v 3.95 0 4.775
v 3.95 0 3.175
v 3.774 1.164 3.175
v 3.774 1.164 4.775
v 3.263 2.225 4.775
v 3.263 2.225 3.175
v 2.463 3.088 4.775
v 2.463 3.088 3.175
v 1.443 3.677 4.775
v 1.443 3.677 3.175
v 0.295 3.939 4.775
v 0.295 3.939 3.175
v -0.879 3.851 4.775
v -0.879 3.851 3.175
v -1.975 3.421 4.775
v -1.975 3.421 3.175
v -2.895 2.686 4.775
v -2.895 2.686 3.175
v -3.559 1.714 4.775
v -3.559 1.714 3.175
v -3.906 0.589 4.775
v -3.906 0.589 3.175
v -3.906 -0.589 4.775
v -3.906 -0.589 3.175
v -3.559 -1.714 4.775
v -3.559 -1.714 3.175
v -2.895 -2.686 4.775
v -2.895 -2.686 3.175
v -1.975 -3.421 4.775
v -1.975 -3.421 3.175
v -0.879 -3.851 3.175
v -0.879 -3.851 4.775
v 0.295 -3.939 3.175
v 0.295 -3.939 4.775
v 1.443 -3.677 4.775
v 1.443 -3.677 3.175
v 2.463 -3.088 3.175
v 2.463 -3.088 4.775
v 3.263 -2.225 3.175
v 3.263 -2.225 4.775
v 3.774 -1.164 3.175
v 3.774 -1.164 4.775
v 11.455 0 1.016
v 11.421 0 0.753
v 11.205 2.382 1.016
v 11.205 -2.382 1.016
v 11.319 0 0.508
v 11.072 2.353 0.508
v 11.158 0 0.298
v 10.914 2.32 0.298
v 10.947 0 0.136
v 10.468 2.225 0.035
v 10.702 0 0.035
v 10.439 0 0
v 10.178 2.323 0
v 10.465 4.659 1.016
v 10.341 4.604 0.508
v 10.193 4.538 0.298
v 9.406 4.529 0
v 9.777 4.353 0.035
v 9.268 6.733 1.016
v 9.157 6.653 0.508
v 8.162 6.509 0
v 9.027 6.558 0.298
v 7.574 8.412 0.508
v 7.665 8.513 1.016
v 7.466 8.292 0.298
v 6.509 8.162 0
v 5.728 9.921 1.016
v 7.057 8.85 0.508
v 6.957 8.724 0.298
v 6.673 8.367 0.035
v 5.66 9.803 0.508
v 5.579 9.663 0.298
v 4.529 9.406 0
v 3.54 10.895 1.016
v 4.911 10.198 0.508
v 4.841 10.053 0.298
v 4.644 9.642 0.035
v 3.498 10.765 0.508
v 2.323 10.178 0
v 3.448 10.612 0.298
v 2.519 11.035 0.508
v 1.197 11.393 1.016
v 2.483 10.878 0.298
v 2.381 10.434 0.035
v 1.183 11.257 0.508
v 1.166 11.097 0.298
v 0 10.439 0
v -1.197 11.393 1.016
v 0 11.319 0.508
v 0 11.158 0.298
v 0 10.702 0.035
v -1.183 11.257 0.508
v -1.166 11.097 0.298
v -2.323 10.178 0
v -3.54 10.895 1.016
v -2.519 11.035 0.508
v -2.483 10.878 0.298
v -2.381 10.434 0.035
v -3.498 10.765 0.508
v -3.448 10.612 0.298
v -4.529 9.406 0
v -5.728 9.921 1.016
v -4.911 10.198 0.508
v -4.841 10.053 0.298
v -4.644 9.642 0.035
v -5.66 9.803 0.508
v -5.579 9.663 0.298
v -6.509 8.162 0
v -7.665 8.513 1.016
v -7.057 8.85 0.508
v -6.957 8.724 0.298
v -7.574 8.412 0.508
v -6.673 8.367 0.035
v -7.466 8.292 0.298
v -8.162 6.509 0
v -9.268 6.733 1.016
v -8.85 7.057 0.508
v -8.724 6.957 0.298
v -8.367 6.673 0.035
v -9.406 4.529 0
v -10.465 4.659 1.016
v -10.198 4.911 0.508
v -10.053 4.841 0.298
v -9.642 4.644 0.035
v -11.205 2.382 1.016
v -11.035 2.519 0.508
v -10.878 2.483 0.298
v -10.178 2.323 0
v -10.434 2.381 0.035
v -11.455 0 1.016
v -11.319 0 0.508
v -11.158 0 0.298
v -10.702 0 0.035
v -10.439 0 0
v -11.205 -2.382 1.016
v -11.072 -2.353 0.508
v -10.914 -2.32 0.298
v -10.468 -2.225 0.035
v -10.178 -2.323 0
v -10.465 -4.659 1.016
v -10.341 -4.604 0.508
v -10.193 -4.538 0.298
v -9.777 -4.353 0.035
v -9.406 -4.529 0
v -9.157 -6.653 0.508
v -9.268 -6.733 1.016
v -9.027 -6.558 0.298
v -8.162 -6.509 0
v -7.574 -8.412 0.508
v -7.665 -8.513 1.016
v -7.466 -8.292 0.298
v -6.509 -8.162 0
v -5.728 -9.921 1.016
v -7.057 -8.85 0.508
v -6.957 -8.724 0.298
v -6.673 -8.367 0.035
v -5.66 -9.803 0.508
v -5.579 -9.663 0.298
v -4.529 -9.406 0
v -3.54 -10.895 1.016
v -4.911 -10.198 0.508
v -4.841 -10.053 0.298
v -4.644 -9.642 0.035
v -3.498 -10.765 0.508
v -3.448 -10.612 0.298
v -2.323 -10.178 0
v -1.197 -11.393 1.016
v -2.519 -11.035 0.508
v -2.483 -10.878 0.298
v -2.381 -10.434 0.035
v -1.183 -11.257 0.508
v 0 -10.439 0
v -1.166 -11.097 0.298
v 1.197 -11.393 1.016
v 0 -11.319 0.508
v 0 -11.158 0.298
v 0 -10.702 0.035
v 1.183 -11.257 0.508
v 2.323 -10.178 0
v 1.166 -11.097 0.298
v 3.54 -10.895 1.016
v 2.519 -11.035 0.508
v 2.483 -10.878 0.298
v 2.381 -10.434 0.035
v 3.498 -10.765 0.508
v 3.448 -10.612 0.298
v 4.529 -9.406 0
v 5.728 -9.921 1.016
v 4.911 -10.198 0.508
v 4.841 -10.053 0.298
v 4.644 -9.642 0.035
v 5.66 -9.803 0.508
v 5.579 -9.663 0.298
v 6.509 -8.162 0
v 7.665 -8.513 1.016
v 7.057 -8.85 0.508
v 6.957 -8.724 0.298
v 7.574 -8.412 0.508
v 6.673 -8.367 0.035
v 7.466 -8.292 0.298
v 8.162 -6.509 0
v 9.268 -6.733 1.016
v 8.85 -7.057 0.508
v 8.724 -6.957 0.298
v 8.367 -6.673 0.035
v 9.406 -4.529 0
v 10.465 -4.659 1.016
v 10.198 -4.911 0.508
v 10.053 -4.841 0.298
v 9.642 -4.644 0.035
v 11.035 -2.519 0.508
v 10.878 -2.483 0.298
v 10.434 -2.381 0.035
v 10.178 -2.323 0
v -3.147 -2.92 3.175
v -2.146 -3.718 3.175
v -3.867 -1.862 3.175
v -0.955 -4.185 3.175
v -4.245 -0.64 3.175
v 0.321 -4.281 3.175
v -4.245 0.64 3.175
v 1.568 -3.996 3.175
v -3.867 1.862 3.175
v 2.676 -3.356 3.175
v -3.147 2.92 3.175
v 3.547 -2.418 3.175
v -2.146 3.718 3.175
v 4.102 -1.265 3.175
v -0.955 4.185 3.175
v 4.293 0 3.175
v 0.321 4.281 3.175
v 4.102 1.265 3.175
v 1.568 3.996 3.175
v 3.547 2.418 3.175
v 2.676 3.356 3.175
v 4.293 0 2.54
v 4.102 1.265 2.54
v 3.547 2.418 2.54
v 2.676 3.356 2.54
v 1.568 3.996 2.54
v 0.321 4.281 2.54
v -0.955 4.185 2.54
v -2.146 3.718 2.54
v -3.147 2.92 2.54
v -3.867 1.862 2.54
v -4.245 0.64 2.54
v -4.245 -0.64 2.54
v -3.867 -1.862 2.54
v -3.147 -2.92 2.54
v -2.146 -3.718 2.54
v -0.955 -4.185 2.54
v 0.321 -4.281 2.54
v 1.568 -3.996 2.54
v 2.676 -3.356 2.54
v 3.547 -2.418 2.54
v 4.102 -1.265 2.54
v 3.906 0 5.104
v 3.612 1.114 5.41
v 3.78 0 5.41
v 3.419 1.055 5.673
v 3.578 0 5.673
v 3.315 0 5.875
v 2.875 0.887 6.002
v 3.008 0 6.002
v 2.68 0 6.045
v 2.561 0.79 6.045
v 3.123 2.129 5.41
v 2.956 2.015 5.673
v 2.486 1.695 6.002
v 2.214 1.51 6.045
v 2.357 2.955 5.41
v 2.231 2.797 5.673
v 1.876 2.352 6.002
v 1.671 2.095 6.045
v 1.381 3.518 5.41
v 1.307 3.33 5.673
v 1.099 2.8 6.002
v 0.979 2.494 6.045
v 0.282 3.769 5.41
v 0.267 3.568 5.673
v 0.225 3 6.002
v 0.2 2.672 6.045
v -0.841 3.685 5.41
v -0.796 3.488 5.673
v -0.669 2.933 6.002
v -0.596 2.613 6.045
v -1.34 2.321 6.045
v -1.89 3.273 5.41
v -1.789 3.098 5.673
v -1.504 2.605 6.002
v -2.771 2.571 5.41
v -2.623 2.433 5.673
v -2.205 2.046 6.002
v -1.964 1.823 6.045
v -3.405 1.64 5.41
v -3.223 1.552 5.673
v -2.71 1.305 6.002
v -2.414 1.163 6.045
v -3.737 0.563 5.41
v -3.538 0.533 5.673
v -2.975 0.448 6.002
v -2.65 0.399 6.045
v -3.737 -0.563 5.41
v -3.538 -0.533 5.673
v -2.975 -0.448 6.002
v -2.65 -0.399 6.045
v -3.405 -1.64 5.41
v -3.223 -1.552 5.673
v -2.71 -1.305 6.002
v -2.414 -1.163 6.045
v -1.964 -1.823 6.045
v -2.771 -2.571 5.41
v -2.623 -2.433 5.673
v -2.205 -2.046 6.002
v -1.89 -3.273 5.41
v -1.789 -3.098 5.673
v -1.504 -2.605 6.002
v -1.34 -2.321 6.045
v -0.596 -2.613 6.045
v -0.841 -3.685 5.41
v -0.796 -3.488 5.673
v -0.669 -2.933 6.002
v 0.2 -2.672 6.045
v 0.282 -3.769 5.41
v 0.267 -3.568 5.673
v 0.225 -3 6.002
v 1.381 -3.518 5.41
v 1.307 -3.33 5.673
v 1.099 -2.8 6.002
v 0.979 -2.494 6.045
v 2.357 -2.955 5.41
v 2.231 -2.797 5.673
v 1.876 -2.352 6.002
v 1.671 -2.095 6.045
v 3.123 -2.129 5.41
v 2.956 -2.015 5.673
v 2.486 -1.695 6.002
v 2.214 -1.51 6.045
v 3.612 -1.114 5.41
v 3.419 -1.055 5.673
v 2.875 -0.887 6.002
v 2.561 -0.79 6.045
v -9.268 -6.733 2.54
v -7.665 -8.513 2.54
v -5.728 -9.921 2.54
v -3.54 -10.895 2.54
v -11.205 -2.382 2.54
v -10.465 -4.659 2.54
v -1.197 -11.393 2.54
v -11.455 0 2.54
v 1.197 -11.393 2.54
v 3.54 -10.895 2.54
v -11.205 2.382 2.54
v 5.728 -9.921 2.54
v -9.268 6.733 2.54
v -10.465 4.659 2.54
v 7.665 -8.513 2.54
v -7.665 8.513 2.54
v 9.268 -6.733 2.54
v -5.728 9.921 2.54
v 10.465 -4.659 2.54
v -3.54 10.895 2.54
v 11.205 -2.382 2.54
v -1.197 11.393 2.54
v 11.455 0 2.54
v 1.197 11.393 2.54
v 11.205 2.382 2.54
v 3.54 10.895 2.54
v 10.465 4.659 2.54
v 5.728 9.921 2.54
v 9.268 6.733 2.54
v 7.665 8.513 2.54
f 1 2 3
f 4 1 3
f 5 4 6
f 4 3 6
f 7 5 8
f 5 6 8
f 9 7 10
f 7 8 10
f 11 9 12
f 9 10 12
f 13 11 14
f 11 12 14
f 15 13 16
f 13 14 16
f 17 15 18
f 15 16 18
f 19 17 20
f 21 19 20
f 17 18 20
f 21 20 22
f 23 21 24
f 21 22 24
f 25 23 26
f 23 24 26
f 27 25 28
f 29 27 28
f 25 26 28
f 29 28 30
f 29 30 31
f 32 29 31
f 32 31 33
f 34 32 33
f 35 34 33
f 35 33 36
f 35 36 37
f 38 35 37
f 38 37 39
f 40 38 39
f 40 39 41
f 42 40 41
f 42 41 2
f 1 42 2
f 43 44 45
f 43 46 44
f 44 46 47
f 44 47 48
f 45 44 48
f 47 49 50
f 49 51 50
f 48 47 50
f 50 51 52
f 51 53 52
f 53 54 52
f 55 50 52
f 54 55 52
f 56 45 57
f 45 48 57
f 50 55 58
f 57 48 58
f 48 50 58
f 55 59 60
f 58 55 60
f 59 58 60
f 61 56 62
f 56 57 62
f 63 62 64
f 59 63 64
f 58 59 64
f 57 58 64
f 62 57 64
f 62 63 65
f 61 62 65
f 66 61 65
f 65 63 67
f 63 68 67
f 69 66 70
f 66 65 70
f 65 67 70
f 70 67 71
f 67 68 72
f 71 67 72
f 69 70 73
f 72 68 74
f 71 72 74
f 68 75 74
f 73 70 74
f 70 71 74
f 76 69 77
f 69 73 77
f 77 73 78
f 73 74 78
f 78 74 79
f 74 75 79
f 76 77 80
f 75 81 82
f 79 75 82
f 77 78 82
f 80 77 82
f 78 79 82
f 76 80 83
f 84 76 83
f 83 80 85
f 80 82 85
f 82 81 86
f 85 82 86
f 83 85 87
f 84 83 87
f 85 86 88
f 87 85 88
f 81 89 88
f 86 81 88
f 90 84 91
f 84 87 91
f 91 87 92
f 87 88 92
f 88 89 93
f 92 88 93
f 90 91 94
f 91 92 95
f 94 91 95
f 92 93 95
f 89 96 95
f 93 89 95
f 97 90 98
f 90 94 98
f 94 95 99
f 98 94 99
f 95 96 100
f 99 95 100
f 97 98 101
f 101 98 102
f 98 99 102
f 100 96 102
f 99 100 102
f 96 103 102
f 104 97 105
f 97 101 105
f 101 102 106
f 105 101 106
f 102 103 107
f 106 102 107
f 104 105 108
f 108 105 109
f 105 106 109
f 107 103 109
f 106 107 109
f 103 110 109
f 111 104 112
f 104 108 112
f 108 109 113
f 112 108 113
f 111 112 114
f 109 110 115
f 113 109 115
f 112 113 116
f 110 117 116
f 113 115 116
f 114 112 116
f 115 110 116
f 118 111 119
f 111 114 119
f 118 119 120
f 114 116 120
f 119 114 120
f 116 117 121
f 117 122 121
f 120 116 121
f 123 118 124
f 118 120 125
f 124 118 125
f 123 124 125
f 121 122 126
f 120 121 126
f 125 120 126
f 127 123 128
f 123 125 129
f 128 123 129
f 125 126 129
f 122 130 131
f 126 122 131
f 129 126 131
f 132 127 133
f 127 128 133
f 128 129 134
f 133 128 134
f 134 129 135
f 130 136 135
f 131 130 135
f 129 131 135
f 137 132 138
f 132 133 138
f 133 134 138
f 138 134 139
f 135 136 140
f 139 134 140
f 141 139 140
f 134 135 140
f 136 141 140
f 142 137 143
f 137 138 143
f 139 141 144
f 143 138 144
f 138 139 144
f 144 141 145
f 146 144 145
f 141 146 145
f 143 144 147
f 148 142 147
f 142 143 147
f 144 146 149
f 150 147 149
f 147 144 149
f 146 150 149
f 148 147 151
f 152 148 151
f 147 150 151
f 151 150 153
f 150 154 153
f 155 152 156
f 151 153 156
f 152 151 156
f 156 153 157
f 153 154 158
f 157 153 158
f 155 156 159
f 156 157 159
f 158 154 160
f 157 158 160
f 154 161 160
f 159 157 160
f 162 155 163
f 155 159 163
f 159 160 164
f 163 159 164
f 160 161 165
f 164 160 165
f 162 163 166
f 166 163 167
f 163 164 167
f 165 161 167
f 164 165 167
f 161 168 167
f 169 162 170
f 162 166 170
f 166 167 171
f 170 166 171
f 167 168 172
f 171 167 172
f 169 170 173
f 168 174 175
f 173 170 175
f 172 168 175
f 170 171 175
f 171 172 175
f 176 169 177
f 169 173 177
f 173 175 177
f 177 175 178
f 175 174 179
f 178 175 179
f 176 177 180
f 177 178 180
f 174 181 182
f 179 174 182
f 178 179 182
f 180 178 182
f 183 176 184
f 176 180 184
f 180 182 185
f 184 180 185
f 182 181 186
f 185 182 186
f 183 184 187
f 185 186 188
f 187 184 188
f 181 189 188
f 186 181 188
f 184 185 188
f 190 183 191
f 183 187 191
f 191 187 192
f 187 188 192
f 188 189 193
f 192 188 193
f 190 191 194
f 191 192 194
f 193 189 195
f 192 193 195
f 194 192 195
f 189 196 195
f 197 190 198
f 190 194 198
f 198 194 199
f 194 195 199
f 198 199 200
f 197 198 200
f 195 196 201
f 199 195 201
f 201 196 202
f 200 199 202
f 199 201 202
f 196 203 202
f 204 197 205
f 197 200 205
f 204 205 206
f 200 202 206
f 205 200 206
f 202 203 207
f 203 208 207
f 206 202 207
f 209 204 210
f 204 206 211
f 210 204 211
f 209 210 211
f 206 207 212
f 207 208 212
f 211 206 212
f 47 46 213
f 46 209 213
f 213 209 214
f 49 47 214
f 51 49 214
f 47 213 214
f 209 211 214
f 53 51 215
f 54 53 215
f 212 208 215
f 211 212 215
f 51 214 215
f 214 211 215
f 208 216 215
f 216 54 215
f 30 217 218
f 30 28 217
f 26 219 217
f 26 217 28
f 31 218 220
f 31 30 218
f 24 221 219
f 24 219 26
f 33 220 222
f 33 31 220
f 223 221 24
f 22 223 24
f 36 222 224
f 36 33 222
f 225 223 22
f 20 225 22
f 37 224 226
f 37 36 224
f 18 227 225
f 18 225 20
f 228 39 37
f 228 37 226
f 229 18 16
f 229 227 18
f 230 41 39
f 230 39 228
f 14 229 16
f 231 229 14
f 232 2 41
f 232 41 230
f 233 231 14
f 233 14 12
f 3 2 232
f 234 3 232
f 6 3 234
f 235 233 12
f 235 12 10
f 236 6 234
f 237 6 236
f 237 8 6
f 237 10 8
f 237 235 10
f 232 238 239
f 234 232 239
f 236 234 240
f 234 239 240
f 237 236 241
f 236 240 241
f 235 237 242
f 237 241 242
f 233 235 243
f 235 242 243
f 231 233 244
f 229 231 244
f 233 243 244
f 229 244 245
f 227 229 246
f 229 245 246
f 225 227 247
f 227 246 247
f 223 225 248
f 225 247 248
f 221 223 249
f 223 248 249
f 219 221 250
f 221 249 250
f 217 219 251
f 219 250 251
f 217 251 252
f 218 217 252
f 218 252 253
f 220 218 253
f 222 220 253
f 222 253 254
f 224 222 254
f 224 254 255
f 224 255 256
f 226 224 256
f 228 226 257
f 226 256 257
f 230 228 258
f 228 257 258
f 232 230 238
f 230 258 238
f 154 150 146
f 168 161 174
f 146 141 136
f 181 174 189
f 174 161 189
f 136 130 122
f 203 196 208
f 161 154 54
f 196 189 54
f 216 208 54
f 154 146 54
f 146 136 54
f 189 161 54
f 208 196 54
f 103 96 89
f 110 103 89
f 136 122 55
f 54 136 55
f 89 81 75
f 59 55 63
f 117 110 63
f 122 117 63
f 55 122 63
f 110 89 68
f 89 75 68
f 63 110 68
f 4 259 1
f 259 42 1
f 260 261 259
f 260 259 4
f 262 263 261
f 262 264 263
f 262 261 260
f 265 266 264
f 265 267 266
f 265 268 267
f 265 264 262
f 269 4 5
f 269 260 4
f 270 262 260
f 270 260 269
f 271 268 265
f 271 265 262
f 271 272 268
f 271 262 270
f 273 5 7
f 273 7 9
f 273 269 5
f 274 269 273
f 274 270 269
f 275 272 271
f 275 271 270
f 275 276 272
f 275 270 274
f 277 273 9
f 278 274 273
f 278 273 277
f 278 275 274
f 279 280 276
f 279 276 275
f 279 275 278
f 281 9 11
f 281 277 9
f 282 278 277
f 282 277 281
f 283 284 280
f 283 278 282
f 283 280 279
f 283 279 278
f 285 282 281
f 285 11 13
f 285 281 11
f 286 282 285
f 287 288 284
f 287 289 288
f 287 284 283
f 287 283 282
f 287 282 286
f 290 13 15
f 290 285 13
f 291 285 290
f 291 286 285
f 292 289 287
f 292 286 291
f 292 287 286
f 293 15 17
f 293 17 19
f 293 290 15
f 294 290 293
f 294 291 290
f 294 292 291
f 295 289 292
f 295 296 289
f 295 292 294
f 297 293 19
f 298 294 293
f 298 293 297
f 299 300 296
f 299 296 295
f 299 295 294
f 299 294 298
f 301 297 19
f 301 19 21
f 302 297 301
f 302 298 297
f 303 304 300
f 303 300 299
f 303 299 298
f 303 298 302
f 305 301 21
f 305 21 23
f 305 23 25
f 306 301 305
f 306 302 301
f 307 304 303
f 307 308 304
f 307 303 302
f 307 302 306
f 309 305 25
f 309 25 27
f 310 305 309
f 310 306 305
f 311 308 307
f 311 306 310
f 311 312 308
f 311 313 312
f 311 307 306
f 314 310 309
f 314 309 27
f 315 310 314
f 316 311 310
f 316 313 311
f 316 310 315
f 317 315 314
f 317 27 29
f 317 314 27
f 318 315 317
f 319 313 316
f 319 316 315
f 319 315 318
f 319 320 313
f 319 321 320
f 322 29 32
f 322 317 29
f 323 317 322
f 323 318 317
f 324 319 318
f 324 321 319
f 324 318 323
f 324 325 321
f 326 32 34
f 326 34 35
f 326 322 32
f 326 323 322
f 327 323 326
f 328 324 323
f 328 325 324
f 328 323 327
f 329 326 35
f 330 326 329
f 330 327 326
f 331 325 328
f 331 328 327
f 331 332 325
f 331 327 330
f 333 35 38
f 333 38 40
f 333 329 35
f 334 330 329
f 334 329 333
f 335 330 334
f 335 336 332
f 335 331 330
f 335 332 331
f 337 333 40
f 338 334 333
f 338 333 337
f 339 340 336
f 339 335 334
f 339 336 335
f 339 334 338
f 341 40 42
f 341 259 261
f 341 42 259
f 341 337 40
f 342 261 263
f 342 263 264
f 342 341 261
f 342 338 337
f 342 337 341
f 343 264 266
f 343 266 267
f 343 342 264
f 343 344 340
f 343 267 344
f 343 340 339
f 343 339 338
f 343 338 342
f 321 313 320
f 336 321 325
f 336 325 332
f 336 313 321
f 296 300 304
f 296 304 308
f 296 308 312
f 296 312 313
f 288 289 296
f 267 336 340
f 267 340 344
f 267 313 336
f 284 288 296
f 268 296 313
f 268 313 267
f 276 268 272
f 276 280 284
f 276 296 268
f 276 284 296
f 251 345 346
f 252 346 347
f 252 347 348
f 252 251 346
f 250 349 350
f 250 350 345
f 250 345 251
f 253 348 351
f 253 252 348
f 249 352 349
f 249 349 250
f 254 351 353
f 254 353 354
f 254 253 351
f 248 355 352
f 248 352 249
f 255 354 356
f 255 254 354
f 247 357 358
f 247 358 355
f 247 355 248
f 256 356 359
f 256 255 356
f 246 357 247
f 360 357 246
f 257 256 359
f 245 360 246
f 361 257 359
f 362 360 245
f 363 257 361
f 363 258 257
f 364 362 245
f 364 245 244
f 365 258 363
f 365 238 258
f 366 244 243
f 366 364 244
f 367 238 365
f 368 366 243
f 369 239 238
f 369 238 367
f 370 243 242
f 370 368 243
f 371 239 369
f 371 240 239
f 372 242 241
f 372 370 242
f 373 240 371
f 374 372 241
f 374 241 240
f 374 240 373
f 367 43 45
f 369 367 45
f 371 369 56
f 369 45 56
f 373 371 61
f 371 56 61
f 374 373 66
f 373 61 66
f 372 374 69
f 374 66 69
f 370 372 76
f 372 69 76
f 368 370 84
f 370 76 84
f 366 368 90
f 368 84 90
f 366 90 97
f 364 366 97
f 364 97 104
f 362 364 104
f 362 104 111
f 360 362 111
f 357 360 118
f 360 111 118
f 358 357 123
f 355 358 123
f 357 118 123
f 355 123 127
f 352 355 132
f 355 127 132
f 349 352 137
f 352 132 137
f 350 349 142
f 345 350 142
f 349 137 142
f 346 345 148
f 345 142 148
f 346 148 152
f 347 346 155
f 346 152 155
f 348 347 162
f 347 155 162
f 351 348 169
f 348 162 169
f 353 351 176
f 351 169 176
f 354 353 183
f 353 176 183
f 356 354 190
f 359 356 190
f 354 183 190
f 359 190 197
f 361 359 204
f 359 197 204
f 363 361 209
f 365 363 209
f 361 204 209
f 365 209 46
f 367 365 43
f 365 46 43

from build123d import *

# Parameters (mm, degrees)
F0_R     = 3.9497
F1_DEPTH = 6.0452
F0_R_2   = 11.4554
F2_DEPTH = 2.54
F3_R     = 1.016
F4_R     = 1.27
F5_R     = 4.2926
F5_R_2   = 3.9497
F6_DEPTH = 0.635


with BuildPart() as f1:
    # F0 (on Top) → F1 (new body)
    with BuildSketch(Plane.XY):
        Circle(F0_R)
    extrude(amount=F1_DEPTH)

    # F0 (on Top) → F2 (join)
    with BuildSketch(Plane.XY):
        Circle(F0_R_2)
        Circle(F0_R, mode=Mode.SUBTRACT)
    extrude(amount=F2_DEPTH)

    # F3
    f3_edges = [f1.edges().sort_by_distance(p)[0] for p in [
        (-11.4554, 0, 0),
    ]]
    fillet(f3_edges, radius=F3_R)

    # F4
    f4_edges = [f1.edges().sort_by_distance(p)[0] for p in [
        (-3.9497, 0, 6.0452),
    ]]
    fillet(f4_edges, radius=F4_R)

    # F5 (on face) → F6 (join)
    with BuildSketch(Plane.XY.offset(2.54)):
        Circle(F5_R)
        Circle(F5_R_2, mode=Mode.SUBTRACT)
    extrude(amount=F6_DEPTH)


solid = f1.part
